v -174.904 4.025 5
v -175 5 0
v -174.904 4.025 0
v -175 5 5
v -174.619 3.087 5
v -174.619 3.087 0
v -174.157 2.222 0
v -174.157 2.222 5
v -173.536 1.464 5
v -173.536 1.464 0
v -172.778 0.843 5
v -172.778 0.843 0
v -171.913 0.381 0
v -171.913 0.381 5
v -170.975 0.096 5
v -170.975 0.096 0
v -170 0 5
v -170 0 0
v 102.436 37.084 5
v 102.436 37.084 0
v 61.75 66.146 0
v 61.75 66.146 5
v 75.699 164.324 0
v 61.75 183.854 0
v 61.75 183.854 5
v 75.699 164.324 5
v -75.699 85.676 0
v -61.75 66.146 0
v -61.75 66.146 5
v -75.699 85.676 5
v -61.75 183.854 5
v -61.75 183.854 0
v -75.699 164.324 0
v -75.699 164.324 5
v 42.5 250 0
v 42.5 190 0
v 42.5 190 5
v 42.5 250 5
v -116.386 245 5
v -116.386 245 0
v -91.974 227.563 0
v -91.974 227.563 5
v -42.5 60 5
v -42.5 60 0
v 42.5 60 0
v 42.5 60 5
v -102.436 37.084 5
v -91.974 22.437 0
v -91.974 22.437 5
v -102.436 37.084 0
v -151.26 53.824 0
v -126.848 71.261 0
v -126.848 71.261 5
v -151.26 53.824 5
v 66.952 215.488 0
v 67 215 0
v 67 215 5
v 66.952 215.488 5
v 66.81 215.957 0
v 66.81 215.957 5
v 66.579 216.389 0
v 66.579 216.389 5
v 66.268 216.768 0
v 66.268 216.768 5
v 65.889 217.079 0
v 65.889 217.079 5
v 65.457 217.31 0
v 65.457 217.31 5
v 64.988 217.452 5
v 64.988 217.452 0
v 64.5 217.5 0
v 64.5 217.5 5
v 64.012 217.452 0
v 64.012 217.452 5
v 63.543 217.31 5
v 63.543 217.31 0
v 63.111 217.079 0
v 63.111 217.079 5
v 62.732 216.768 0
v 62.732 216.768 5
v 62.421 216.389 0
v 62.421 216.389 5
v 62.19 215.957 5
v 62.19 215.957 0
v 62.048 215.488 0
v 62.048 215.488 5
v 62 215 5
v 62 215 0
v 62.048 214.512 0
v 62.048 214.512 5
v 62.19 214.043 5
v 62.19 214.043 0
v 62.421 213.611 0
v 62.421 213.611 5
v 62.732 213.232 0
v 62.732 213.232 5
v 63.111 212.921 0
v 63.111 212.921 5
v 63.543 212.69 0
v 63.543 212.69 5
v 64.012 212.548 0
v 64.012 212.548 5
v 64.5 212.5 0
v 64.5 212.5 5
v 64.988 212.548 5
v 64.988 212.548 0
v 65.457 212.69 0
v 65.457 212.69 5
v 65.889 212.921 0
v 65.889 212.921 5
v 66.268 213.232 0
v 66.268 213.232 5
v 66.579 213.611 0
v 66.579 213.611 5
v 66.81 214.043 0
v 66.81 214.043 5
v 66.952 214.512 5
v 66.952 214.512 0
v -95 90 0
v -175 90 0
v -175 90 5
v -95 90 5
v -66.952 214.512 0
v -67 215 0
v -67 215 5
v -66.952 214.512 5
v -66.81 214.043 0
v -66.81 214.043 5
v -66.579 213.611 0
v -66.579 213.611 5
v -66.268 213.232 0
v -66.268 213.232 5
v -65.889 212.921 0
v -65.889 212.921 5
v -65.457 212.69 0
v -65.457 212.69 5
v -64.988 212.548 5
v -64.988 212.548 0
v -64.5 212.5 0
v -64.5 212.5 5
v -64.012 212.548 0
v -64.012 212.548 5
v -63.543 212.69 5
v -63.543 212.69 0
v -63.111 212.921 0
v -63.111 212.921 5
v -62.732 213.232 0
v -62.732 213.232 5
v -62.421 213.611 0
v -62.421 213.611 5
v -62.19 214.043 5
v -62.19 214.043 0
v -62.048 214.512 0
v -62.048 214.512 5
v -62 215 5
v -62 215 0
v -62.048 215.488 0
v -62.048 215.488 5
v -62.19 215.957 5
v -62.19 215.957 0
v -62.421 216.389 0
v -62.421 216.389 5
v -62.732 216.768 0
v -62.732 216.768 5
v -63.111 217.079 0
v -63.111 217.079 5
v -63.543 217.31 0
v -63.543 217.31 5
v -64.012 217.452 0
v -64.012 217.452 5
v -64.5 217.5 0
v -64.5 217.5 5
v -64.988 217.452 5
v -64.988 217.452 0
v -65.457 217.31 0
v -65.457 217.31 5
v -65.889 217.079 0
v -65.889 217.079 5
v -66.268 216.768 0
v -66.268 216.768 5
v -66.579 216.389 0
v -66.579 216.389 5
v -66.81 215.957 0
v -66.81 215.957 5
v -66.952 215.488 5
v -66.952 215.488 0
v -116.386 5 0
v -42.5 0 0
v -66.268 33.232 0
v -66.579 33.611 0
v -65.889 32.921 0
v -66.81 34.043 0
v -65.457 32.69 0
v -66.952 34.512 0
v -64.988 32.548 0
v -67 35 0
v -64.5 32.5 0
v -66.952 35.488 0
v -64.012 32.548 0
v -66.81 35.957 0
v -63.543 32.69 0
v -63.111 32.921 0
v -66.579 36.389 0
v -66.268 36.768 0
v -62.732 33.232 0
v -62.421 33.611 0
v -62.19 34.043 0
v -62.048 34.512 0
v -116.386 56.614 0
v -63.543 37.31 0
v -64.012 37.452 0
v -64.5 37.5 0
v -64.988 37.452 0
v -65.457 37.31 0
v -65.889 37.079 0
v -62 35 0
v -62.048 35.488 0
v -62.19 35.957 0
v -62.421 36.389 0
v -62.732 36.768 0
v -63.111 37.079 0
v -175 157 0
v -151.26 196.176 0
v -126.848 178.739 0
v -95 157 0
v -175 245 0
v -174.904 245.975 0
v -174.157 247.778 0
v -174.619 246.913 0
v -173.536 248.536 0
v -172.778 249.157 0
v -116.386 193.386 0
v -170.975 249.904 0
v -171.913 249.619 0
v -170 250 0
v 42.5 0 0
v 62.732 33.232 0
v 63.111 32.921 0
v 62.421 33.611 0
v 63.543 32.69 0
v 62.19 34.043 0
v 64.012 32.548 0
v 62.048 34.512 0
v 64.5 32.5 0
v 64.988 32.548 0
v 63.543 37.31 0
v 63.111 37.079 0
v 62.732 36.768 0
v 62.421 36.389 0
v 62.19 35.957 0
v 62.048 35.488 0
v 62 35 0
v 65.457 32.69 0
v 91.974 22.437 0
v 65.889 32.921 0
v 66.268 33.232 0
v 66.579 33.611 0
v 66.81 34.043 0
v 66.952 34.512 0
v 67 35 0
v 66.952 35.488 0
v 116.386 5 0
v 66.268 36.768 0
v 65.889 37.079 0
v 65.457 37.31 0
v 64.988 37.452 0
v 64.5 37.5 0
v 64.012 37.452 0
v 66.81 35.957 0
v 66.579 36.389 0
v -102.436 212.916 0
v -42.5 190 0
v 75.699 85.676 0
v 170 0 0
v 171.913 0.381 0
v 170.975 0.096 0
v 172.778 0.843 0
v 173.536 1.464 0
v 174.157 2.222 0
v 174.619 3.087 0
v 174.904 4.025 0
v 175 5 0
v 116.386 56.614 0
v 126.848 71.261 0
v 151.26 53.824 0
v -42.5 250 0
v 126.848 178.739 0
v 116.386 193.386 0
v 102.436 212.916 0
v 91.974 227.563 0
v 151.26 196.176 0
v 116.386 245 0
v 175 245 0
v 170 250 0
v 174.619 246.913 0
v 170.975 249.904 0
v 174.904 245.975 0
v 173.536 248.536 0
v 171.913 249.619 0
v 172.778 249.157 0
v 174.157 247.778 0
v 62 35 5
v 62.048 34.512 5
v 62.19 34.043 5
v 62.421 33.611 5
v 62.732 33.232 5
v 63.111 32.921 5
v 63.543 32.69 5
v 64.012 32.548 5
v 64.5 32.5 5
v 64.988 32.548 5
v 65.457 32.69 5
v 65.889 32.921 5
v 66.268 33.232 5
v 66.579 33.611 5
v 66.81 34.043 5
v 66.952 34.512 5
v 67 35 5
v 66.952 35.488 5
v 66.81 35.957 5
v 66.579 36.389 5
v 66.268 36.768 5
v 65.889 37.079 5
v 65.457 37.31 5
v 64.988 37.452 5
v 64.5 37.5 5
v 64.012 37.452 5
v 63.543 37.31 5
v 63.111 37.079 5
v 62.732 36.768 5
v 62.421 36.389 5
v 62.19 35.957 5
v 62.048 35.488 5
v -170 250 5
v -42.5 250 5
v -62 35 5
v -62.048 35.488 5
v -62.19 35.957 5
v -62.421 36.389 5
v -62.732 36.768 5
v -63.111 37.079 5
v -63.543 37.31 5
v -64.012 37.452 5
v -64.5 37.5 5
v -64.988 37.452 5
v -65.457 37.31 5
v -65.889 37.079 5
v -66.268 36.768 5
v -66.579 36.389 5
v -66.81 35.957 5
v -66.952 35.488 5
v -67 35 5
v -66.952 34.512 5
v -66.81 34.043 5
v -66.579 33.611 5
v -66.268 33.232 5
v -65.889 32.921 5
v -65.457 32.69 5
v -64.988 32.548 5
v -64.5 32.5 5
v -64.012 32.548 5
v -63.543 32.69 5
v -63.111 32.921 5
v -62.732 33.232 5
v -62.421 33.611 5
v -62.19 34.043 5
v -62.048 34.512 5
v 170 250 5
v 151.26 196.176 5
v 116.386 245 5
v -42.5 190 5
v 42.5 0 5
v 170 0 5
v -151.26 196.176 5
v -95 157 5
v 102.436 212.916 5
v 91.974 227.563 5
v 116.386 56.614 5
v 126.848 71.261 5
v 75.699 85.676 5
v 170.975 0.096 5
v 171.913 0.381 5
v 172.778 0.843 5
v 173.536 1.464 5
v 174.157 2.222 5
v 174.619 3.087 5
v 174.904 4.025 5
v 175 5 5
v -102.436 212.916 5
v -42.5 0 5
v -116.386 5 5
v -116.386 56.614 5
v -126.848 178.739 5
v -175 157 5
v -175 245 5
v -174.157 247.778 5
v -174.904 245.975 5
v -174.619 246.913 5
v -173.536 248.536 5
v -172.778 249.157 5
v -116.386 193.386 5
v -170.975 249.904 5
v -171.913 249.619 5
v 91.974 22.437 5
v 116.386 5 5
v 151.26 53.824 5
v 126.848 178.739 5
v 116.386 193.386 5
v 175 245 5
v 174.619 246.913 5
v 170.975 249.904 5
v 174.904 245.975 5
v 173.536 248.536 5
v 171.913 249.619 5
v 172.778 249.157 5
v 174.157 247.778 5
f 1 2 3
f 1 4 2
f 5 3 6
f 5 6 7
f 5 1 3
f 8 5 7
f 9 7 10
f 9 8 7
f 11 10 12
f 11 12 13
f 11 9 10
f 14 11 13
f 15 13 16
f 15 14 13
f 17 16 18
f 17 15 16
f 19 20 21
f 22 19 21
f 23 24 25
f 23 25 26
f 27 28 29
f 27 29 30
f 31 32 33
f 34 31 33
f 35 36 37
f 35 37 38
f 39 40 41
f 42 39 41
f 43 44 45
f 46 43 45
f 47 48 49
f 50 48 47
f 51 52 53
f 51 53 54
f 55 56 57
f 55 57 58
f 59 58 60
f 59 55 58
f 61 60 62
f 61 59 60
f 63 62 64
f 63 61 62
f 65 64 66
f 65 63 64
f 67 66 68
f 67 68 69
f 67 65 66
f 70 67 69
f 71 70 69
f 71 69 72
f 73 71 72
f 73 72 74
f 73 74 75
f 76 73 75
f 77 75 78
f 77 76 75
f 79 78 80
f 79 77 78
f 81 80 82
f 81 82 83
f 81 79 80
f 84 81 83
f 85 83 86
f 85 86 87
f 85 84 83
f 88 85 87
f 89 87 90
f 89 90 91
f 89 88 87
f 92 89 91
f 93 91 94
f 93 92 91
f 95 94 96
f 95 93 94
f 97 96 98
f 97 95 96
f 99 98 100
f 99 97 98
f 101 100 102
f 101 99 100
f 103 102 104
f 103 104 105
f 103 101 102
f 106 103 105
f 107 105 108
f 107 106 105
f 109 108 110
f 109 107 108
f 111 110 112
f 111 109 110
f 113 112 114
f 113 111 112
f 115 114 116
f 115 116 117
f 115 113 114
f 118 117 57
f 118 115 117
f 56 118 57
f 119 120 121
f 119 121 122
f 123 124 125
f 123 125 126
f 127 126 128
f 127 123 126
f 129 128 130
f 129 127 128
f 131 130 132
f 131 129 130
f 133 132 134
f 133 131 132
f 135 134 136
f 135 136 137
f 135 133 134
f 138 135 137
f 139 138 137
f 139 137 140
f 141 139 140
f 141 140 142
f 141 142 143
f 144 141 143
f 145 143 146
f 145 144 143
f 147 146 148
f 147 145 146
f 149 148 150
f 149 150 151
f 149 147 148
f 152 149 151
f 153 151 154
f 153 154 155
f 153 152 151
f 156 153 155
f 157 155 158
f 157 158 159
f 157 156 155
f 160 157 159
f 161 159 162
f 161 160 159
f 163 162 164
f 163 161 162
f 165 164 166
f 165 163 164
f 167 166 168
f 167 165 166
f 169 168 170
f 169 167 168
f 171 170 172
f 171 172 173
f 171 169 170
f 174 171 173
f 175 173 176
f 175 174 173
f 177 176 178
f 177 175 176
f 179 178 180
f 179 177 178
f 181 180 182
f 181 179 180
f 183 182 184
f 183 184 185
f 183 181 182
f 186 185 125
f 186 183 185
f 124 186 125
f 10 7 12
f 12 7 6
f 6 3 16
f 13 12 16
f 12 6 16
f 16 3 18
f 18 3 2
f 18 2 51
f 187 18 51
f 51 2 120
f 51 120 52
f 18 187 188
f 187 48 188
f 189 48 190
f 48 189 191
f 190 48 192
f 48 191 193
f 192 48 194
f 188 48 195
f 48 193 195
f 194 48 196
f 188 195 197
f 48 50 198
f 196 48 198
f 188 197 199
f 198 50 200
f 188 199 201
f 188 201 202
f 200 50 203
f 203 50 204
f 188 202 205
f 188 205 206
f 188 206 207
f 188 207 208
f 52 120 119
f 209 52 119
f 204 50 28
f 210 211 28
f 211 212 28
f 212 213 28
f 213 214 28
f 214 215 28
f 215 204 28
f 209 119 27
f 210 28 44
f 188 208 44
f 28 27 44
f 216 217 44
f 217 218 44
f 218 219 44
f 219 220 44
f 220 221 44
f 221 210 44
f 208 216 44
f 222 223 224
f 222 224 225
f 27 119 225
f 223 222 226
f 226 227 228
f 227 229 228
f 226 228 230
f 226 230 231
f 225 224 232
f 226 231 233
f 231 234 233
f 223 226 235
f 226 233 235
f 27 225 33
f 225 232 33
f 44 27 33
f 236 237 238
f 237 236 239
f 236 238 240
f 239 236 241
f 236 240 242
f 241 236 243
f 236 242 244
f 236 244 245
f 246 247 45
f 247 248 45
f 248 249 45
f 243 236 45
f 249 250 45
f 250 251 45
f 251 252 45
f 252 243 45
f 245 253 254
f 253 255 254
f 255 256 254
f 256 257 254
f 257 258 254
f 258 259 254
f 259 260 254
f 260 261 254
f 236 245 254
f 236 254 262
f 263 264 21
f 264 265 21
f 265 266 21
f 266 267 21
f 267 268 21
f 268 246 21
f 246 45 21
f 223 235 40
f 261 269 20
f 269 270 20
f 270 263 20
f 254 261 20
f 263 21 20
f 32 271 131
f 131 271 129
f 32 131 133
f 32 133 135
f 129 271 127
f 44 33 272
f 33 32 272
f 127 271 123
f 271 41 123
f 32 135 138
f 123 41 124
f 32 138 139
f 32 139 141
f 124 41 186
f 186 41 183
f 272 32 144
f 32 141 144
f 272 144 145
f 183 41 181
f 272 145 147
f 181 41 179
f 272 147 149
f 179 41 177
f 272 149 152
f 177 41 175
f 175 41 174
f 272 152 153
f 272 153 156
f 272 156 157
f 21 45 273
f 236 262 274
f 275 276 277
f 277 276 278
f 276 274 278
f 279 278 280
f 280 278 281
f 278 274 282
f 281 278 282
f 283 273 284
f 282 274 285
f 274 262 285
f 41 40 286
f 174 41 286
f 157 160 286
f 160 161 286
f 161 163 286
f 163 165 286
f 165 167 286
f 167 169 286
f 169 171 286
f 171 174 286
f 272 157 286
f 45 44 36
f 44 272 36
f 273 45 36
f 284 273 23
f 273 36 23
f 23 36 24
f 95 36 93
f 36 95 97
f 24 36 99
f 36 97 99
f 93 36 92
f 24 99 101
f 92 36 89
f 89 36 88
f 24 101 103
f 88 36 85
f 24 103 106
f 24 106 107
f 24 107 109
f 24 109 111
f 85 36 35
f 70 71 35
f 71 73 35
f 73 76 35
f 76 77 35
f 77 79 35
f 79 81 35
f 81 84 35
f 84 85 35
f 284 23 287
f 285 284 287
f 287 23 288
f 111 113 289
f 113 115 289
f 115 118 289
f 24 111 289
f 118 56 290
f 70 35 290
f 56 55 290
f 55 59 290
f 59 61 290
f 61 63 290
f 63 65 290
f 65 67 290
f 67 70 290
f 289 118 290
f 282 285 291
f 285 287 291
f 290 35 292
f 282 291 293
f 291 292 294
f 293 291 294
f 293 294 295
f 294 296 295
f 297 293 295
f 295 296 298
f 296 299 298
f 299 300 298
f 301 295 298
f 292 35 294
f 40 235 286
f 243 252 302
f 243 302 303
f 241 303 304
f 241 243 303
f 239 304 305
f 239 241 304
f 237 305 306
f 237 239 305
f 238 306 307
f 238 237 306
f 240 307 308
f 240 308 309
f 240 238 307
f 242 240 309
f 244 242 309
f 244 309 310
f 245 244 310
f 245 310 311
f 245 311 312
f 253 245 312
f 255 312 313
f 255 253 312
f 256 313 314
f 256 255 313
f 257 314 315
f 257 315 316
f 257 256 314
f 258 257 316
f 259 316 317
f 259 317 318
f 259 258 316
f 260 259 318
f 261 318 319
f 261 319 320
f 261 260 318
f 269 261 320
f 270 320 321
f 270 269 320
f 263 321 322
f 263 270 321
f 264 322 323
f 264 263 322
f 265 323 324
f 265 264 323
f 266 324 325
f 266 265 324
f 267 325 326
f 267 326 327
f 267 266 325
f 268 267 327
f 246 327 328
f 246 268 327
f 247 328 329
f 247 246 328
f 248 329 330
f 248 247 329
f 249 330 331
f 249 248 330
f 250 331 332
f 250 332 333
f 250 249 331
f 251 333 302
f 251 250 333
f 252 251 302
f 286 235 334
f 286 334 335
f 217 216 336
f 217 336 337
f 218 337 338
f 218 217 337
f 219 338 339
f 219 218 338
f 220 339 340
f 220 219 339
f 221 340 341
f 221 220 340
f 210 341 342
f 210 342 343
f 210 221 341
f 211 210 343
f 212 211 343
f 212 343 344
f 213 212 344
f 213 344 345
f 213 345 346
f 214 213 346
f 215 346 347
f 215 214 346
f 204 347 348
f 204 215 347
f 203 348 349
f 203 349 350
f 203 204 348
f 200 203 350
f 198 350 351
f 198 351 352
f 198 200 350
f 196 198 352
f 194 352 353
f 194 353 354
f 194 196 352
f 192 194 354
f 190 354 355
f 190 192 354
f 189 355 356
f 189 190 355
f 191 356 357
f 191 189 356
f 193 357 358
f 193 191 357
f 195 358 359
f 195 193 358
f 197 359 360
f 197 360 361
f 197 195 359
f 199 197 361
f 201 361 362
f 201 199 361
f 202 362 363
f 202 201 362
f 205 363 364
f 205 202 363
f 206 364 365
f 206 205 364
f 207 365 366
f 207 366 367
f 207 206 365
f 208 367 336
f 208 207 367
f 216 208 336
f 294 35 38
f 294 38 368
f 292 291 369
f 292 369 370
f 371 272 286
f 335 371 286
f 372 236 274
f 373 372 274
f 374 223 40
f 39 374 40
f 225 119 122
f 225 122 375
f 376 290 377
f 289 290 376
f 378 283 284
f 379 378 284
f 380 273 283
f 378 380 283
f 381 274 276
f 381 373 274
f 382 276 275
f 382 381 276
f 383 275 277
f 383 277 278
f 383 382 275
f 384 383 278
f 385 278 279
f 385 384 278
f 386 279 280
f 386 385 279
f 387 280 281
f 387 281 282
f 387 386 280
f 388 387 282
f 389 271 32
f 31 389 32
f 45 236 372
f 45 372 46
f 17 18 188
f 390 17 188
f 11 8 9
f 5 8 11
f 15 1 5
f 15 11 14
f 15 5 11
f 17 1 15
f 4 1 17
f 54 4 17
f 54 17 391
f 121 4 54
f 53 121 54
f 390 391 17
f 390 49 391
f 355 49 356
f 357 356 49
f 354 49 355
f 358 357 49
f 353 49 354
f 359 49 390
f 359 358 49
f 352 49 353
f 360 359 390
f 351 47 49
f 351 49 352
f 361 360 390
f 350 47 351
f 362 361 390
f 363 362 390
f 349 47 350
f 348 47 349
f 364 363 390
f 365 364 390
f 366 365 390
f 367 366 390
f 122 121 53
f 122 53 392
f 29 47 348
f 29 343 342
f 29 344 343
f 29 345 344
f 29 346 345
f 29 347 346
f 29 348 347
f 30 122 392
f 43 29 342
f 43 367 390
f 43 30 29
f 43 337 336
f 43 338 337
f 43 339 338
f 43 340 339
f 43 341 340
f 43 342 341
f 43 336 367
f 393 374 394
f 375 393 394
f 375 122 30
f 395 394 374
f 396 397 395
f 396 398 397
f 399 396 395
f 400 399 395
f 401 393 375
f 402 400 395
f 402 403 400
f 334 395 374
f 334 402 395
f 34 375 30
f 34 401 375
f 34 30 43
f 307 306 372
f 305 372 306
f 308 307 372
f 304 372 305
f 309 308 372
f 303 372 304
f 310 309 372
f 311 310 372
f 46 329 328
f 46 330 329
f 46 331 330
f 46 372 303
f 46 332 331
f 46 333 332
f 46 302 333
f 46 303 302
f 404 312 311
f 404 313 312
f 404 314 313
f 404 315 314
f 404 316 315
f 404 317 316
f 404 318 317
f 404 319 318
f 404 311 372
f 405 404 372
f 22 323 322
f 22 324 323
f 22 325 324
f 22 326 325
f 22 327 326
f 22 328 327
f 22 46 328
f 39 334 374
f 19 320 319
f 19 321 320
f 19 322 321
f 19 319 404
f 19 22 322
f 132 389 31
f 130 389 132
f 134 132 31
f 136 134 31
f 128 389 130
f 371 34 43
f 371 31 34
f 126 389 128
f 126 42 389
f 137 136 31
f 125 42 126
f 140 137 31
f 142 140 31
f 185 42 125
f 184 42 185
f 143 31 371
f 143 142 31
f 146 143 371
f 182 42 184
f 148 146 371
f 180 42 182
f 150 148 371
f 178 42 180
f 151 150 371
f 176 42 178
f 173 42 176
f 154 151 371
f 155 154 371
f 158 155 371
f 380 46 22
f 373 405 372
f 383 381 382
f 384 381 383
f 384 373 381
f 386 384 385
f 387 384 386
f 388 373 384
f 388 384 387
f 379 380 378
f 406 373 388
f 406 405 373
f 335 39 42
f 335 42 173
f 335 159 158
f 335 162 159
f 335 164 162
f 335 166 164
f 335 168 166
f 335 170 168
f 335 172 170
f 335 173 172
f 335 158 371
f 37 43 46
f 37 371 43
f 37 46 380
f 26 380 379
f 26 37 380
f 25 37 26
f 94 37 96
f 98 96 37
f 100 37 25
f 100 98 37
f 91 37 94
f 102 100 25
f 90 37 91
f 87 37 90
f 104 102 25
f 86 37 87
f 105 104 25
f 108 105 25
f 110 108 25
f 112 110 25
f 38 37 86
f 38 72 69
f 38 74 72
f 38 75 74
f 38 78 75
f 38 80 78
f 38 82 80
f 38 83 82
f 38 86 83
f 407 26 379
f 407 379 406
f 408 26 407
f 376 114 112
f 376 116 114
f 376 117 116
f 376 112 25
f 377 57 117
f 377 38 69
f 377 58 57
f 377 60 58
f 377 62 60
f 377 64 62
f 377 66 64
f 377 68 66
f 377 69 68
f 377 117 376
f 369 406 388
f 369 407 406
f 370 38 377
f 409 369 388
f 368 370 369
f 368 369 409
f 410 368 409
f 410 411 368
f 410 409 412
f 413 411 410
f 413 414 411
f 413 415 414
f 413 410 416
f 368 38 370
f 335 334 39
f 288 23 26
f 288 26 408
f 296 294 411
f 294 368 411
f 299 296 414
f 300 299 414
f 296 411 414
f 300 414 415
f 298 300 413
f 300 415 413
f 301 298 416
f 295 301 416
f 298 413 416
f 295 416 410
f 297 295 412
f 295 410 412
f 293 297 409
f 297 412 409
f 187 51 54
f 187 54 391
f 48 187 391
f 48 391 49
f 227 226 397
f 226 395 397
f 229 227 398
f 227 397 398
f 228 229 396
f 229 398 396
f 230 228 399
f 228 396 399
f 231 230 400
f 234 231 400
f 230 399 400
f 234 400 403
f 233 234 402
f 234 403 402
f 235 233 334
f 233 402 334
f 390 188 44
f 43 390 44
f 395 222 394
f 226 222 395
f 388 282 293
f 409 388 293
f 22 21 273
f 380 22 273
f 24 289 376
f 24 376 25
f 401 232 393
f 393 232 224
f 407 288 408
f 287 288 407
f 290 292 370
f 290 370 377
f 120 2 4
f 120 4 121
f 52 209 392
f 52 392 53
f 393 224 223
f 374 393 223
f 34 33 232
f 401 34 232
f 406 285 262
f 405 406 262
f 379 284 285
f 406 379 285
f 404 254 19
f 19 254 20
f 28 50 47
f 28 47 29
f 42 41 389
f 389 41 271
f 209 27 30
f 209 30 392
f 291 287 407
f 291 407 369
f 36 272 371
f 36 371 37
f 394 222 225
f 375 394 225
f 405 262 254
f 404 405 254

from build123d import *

# Parameters (mm, degrees)
ESQUISSE1_W              = 350
ESQUISSE1_H              = 250
BOSS_EXTRU_1_DEPTH       = 5
ENL_V_MAT_EXTRU_1_DEPTH  = 5
CONG_1_R                 = 5
ESQUISSE8_W              = 85
ESQUISSE8_H              = 60
ENL_V_MAT_EXTRU_12_DEPTH = 5
ESQUISSE9_R              = 2.5
ENL_V_MAT_EXTRU_14_DEPTH = 5
ESQUISSE10_W             = 80
ESQUISSE10_H             = 67
ENL_V_MAT_EXTRU_15_DEPTH = 10


with BuildPart() as part:
    # Esquisse1 → Boss.-Extru.1 (new body)
    with BuildSketch(Plane.XY):
        with Locations((0, 125)):
            Rectangle(ESQUISSE1_W, ESQUISSE1_H)
    extrude(amount=BOSS_EXTRU_1_DEPTH)

    # Esquisse2 → Enlèv. mat.-Extru.1 (cut)
    with BuildSketch(Plane.XY):
        Polygon((-61.749658188, 183.853742021), (-75.699374837, 164.324138712), (-116.386048398, 193.386048398), (-126.848335885, 178.738845916), (-151.260340021, 196.175991728), (-116.386048398, 245), (-91.974044262, 227.562854188), (-102.436331748, 212.915651707), align=None)
        Polygon((61.749658188, 183.853742021), (75.699374837, 164.324138712), (116.386048398, 193.386048398), (126.848335885, 178.738845916), (151.260340021, 196.175991728), (116.386048398, 245), (91.974044262, 227.562854188), (102.436331748, 212.915651707), align=None)
        Polygon((61.749658188, 66.146257979), (75.699374837, 85.675861288), (116.386048398, 56.613951602), (126.848335885, 71.261154084), (151.260340021, 53.824008272), (116.386048398, 5), (91.974044262, 22.437145812), (102.436331748, 37.084348293), align=None)
        Polygon((-61.749658188, 66.146257979), (-75.699374837, 85.675861288), (-116.386048398, 56.613951602), (-126.848335885, 71.261154084), (-151.260340021, 53.824008272), (-116.386048398, 5), (-91.974044262, 22.437145812), (-102.436331748, 37.084348293), align=None)
    extrude(amount=ENL_V_MAT_EXTRU_1_DEPTH, mode=Mode.SUBTRACT)

    # Congé1
    cong_1_edges = [part.edges().sort_by_distance(p)[0] for p in [
        (-175, 250, 2.5),
        (175, 250, 2.5),
        (175, 0, 2.5),
        (-175, 0, 2.5),
    ]]
    fillet(cong_1_edges, radius=CONG_1_R)

    # Esquisse8 → Enlèv. mat.-Extru.12 (cut)
    with BuildSketch(Plane.XY):
        with Locations((0, 220)):
            Rectangle(ESQUISSE8_W, ESQUISSE8_H)
        with Locations((0, 30)):
            Rectangle(ESQUISSE8_W, ESQUISSE8_H)
    extrude(amount=ENL_V_MAT_EXTRU_12_DEPTH, mode=Mode.SUBTRACT)

    # Esquisse9 → Enlèv. mat.-Extru.14 (cut)
    with BuildSketch(Plane.XY):
        with Locations((-64.5, 35)):
            Circle(ESQUISSE9_R)
        with Locations(Location((64.5, 35, 0), (0, 0, 180))):
            Circle(ESQUISSE9_R)
        with Locations((64.5, 215)):
            Circle(ESQUISSE9_R)
        with Locations(Location((-64.5, 215, 0), (0, 0, 180))):
            Circle(ESQUISSE9_R)
    extrude(amount=ENL_V_MAT_EXTRU_14_DEPTH, mode=Mode.SUBTRACT)

    # Esquisse10 → Enlèv. mat.-Extru.15 (cut)
    with BuildSketch(Plane.XY):
        with Locations((-135, 123.5)):
            Rectangle(ESQUISSE10_W, ESQUISSE10_H)
    extrude(amount=ENL_V_MAT_EXTRU_15_DEPTH, mode=Mode.SUBTRACT)


solid = part.part
